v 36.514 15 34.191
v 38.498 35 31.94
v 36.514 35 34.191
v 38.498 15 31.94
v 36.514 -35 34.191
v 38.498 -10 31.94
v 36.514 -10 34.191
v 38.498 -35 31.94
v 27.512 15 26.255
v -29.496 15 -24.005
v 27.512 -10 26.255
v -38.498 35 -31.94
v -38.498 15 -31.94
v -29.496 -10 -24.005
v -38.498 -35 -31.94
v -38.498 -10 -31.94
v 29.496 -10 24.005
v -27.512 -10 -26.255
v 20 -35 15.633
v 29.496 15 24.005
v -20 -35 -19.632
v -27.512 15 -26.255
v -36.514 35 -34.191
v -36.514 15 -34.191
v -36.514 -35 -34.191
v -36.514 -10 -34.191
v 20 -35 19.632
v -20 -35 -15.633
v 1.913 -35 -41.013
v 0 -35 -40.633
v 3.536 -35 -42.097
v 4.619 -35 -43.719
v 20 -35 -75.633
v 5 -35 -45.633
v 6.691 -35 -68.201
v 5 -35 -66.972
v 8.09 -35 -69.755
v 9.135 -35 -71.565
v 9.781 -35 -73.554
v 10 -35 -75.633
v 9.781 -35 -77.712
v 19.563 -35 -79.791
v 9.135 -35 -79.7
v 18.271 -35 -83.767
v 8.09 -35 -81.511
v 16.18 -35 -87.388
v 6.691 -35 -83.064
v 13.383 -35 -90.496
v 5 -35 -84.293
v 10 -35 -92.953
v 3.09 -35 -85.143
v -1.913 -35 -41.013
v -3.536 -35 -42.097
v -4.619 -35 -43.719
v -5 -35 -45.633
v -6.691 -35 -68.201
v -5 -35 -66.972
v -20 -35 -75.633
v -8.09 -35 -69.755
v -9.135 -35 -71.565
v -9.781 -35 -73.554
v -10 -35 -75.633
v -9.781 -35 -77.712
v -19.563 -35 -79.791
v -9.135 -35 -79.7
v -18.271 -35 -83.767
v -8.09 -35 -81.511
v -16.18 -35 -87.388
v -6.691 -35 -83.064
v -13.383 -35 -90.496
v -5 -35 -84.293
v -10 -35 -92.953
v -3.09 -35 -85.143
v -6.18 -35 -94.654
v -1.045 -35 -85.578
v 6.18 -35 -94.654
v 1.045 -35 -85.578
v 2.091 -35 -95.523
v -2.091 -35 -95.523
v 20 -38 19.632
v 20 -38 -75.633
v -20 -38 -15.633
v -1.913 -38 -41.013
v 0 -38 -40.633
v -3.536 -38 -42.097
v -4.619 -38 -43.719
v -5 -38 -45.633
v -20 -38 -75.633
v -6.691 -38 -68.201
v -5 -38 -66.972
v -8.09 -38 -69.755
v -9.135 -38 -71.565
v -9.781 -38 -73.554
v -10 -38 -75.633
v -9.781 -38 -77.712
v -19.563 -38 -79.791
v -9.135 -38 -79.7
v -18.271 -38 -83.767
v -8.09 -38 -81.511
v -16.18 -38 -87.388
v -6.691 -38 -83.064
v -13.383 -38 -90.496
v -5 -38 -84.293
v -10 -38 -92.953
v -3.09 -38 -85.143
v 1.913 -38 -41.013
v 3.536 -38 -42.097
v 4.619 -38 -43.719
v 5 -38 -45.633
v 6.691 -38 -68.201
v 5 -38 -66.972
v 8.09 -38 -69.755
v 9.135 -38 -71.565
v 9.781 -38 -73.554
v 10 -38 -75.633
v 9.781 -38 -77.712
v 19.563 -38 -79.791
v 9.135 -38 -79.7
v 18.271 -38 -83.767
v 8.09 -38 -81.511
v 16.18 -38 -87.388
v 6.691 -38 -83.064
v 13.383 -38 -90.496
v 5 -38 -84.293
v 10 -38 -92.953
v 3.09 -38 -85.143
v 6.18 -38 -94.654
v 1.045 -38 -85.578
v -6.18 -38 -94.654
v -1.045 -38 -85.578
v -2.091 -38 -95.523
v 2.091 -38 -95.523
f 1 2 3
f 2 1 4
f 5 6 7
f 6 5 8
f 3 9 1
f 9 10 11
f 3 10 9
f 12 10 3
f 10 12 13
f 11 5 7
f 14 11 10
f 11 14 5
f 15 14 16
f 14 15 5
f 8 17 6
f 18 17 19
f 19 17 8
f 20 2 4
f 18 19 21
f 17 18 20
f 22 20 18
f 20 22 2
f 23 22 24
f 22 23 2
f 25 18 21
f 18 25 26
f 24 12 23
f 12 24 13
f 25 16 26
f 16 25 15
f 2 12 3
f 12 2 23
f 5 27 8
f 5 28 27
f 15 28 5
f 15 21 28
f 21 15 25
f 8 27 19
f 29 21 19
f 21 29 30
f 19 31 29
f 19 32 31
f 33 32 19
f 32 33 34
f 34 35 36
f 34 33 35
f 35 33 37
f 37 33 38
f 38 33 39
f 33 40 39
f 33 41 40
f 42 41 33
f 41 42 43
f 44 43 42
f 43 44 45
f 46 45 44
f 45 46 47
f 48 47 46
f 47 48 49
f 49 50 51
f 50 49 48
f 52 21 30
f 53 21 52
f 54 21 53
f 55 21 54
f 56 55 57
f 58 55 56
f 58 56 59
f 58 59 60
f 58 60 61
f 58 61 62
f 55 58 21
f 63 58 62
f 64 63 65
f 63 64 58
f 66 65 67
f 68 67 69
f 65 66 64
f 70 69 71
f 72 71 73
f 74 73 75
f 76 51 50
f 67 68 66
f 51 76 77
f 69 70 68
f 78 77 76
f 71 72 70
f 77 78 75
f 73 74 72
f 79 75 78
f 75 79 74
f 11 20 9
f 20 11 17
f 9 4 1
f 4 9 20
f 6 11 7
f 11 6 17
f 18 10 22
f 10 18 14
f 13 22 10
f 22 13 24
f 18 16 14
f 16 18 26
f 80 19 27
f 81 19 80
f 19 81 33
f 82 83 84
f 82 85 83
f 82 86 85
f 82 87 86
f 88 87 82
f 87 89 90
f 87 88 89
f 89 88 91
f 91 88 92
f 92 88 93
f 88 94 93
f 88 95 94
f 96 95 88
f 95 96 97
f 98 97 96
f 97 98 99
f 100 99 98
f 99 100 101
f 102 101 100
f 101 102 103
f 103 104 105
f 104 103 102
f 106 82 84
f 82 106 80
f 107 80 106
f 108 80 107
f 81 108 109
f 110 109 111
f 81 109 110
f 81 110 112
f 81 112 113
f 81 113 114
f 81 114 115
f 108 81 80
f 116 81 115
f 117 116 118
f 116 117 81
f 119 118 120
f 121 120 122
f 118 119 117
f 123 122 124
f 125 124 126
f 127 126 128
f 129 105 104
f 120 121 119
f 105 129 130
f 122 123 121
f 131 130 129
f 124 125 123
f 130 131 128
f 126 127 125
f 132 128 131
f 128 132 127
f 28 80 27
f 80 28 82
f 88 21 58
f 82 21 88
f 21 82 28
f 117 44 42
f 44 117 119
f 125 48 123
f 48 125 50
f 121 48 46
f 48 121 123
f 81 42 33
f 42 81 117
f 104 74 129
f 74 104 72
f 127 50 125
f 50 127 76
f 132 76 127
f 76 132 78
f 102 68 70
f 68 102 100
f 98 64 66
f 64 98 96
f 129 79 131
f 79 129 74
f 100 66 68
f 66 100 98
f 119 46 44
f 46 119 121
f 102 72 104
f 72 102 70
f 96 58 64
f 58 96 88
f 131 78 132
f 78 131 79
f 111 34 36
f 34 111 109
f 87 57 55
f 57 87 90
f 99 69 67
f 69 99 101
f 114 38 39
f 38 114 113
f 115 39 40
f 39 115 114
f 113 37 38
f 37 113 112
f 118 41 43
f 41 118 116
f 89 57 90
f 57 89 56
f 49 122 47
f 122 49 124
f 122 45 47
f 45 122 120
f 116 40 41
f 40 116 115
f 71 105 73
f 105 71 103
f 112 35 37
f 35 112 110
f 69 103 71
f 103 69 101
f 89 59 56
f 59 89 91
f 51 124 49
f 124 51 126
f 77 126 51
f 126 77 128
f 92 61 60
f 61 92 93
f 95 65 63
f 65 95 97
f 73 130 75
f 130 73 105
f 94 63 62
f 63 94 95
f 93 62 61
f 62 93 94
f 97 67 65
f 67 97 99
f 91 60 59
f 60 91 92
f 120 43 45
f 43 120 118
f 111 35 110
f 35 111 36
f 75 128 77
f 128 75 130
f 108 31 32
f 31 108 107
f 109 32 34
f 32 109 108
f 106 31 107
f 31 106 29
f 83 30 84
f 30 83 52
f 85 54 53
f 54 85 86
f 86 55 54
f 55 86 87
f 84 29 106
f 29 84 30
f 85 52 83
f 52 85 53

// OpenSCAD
union($fn = 100) {
    rotate([0, -41.4, 0])
    difference() {
        cube([100, 70, 3], center = true);
        translate([44, 2.5, 0])
            cube([12, 25, 3], center = true);
        translate([-44, 2.5, 0])
            cube([12, 25, 3], center = true);
    }
    translate([0, -36.5, -(48.5-2.8673)])
        rotate([90, 0, 0])
            difference() {
                union() {
                    cube([40, 60, 3], center = true);
                    translate([0, -30, 0])
                        cylinder(h = 3, d = 40, center = true);
                    translate([-20, 30, -1.5])
                    intersection() {
                        cube([40, 66, 3]);
                        rotate_extrude(angle = 41.4)
                            square([60, 3]);
                    }
                }
                translate([0, -15, 0])
                union() {
                    cube([10, 30, 3], center = true);
                    translate([0, -15, 0])
                        cylinder(h = 3, d = 20, center = true);
                    translate([0, 15, 0])
                        cylinder(h = 3, d = 10, center = true);
                }
            }
}
